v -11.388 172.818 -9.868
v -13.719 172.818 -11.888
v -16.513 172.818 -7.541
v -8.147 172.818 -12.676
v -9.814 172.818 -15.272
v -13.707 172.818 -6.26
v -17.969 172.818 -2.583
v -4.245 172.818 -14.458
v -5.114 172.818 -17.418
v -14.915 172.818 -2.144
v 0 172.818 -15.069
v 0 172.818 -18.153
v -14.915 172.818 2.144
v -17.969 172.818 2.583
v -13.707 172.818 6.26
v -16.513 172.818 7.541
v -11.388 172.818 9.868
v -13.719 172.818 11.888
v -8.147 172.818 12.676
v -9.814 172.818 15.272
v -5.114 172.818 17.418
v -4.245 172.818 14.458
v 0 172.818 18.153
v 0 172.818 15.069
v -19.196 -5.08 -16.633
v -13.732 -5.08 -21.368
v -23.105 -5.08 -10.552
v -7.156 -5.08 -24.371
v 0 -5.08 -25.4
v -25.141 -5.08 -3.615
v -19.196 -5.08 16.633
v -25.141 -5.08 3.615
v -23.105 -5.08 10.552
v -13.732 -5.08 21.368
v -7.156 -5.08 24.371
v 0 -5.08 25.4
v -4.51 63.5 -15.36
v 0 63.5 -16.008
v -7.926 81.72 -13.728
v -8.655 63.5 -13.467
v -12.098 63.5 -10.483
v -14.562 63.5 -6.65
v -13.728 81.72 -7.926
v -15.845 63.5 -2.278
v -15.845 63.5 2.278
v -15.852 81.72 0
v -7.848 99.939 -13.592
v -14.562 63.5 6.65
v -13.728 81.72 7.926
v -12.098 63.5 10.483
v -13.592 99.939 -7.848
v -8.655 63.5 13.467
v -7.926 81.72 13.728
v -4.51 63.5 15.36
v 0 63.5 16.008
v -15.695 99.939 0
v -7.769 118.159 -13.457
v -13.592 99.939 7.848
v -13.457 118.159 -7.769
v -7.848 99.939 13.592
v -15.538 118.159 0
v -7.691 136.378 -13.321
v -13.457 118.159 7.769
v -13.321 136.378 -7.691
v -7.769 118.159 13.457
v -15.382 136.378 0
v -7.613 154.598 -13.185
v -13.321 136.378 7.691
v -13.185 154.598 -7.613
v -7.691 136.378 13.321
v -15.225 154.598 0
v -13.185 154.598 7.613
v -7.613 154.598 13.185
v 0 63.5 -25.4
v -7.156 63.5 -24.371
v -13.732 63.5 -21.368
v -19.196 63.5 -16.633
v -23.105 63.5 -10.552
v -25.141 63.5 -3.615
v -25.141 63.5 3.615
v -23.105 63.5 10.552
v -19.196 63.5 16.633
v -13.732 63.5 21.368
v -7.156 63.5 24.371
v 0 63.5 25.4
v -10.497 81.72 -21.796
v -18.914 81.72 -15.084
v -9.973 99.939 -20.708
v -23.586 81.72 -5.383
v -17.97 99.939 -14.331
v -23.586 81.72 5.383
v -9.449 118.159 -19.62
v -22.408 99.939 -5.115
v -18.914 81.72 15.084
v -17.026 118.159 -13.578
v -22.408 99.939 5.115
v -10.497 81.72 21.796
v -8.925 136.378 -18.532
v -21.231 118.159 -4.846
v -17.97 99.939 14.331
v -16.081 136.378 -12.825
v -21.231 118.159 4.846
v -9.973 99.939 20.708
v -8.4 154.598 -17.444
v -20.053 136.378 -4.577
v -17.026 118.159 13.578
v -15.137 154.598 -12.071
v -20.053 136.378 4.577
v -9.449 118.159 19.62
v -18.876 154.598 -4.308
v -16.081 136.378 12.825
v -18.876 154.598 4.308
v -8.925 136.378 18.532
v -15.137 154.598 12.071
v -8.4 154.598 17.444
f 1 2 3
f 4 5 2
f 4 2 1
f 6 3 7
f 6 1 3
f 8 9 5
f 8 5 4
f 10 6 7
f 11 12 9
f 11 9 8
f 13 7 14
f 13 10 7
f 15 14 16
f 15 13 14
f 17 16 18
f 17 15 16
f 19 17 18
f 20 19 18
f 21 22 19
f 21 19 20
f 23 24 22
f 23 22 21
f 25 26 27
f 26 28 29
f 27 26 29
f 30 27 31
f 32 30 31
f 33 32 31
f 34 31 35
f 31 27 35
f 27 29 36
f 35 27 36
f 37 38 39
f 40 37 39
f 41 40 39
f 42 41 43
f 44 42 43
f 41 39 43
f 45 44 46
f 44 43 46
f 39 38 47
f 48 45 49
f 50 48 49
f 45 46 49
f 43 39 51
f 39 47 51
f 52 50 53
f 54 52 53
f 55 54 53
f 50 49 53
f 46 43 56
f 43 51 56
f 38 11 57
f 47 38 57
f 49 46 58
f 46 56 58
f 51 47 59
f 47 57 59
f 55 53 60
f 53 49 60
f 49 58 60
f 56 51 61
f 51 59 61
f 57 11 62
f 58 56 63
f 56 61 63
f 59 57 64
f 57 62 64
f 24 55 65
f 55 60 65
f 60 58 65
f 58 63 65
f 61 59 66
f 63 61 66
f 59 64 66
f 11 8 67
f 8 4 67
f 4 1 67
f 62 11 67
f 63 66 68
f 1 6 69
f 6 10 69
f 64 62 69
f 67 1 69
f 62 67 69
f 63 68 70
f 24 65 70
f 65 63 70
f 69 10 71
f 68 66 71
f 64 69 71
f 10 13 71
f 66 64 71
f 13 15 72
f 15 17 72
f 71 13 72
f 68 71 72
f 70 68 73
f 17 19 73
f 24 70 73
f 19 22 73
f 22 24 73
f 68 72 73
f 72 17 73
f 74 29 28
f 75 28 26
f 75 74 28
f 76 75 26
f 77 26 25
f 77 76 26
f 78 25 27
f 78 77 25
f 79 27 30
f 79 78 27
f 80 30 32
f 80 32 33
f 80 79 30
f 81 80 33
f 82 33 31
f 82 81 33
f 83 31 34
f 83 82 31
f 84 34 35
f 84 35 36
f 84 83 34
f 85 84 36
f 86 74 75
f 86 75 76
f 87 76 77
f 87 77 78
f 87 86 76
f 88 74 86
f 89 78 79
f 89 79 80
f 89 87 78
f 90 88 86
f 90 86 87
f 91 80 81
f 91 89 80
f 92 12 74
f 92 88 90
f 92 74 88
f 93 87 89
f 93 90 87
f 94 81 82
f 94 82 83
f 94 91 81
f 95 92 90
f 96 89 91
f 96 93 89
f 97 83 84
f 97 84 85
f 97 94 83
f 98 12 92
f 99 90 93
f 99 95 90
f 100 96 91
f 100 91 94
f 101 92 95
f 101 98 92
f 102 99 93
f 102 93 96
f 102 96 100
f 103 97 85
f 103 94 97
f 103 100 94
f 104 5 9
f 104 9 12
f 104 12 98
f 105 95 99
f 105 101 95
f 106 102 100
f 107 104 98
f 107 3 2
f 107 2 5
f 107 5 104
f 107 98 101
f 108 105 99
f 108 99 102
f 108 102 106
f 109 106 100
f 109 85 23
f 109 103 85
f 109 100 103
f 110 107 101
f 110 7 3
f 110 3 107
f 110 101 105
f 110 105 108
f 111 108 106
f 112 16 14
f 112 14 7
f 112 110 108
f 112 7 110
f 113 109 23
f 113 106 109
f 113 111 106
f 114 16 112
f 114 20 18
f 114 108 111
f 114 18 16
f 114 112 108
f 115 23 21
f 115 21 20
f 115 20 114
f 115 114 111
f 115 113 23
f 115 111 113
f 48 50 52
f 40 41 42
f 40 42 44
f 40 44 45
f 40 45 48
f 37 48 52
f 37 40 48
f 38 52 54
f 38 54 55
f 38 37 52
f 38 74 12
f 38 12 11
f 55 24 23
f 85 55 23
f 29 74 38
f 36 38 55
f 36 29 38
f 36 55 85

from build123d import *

# Parameters (mm, degrees)
SKETCH2_R                = 25.4
BOSS_EXTRUDE1_DEPTH      = 63.5
BOSS_EXTRUDE1_DEPTH_BACK = 5.08
SKETCH3_R                = 25.4
BOSS_EXTRUDE2_DEPTH      = 109.317536
BOSS_EXTRUDE2_TAPER      = 3.79256
SKETCH4_R                = 15.06855
CUT_EXTRUDE1_DEPTH       = 109.317536
CUT_EXTRUDE1_DRAFT       = 0.49256
SPLIT2_SURFACE_1_BACK    = 192.856
SPLIT2_SURFACE_1_DEPTH   = 385.712


with BuildPart() as part:
    # Sketch2 → Boss-Extrude1 (new, two sides)
    with BuildSketch(Plane(origin=(0, 0, 0), x_dir=(1, 0, 0), z_dir=(0, 1, 0))) as boss_extrude1_sk:
        with Locations(Location((0, 0, 0), (0, 0, 270))):
            Circle(SKETCH2_R)
    extrude(amount=BOSS_EXTRUDE1_DEPTH)
    extrude(boss_extrude1_sk.sketch, amount=-BOSS_EXTRUDE1_DEPTH_BACK)

    # Sketch3 → Boss-Extrude2 (add)
    with BuildSketch(Plane(origin=(0, 63.5, 0), x_dir=(1, 0, 0), z_dir=(0, 1, 0))):
        with Locations(Location((0, 0, 0), (0, 0, 270))):
            Circle(SKETCH3_R)
    extrude(amount=BOSS_EXTRUDE2_DEPTH, taper=BOSS_EXTRUDE2_TAPER)


with BuildPart() as cut_extrude1_tool:
    # Sketch4 → Cut-Extrude1 (with draft: the straight prism first)
    with BuildSketch(Plane(origin=(0, 172.817536, 0), x_dir=(1, 0, 0), z_dir=(0, 1, 0))):
        Circle(SKETCH4_R)
    extrude(amount=-CUT_EXTRUDE1_DEPTH)
    # Cut-Extrude1: the draft: its side faces are tilted about the plane it starts from
    cut_extrude1_sides = [cut_extrude1_tool.faces().sort_by_distance(p)[0] for p in [
        (-15.06855, 118.158768, 0),
    ]]
    draft(cut_extrude1_sides, Plane(origin=(0, 172.817536, 0), x_dir=(1, 0, 0), z_dir=(0, 1, 0)), CUT_EXTRUDE1_DRAFT)


with BuildPart() as part_1:
    add(part.part)

    # Cut-Extrude1: cut by cut_extrude1_tool
    add(cut_extrude1_tool.part, mode=Mode.SUBTRACT)

    # Split2: cut with a surface, the side behind it stays
    # Split2 surface: a surface, the sketch's curves swept straight by 385.712 mm
    with BuildLine(Plane(origin=(0, 0, 0), x_dir=(1, 0, 0), z_dir=(0, 1, 0)).offset(-SPLIT2_SURFACE_1_BACK), mode=Mode.PRIVATE) as split2_surface_1_path:
        Line((0, 25.4), (0, -25.4))
    split2_surface_1 = Shell.extrude(split2_surface_1_path.wire(), (0 * SPLIT2_SURFACE_1_DEPTH, 1 * SPLIT2_SURFACE_1_DEPTH, 0 * SPLIT2_SURFACE_1_DEPTH))
    split(bisect_by=split2_surface_1, keep=Keep.BOTTOM)


solid = part_1.part
